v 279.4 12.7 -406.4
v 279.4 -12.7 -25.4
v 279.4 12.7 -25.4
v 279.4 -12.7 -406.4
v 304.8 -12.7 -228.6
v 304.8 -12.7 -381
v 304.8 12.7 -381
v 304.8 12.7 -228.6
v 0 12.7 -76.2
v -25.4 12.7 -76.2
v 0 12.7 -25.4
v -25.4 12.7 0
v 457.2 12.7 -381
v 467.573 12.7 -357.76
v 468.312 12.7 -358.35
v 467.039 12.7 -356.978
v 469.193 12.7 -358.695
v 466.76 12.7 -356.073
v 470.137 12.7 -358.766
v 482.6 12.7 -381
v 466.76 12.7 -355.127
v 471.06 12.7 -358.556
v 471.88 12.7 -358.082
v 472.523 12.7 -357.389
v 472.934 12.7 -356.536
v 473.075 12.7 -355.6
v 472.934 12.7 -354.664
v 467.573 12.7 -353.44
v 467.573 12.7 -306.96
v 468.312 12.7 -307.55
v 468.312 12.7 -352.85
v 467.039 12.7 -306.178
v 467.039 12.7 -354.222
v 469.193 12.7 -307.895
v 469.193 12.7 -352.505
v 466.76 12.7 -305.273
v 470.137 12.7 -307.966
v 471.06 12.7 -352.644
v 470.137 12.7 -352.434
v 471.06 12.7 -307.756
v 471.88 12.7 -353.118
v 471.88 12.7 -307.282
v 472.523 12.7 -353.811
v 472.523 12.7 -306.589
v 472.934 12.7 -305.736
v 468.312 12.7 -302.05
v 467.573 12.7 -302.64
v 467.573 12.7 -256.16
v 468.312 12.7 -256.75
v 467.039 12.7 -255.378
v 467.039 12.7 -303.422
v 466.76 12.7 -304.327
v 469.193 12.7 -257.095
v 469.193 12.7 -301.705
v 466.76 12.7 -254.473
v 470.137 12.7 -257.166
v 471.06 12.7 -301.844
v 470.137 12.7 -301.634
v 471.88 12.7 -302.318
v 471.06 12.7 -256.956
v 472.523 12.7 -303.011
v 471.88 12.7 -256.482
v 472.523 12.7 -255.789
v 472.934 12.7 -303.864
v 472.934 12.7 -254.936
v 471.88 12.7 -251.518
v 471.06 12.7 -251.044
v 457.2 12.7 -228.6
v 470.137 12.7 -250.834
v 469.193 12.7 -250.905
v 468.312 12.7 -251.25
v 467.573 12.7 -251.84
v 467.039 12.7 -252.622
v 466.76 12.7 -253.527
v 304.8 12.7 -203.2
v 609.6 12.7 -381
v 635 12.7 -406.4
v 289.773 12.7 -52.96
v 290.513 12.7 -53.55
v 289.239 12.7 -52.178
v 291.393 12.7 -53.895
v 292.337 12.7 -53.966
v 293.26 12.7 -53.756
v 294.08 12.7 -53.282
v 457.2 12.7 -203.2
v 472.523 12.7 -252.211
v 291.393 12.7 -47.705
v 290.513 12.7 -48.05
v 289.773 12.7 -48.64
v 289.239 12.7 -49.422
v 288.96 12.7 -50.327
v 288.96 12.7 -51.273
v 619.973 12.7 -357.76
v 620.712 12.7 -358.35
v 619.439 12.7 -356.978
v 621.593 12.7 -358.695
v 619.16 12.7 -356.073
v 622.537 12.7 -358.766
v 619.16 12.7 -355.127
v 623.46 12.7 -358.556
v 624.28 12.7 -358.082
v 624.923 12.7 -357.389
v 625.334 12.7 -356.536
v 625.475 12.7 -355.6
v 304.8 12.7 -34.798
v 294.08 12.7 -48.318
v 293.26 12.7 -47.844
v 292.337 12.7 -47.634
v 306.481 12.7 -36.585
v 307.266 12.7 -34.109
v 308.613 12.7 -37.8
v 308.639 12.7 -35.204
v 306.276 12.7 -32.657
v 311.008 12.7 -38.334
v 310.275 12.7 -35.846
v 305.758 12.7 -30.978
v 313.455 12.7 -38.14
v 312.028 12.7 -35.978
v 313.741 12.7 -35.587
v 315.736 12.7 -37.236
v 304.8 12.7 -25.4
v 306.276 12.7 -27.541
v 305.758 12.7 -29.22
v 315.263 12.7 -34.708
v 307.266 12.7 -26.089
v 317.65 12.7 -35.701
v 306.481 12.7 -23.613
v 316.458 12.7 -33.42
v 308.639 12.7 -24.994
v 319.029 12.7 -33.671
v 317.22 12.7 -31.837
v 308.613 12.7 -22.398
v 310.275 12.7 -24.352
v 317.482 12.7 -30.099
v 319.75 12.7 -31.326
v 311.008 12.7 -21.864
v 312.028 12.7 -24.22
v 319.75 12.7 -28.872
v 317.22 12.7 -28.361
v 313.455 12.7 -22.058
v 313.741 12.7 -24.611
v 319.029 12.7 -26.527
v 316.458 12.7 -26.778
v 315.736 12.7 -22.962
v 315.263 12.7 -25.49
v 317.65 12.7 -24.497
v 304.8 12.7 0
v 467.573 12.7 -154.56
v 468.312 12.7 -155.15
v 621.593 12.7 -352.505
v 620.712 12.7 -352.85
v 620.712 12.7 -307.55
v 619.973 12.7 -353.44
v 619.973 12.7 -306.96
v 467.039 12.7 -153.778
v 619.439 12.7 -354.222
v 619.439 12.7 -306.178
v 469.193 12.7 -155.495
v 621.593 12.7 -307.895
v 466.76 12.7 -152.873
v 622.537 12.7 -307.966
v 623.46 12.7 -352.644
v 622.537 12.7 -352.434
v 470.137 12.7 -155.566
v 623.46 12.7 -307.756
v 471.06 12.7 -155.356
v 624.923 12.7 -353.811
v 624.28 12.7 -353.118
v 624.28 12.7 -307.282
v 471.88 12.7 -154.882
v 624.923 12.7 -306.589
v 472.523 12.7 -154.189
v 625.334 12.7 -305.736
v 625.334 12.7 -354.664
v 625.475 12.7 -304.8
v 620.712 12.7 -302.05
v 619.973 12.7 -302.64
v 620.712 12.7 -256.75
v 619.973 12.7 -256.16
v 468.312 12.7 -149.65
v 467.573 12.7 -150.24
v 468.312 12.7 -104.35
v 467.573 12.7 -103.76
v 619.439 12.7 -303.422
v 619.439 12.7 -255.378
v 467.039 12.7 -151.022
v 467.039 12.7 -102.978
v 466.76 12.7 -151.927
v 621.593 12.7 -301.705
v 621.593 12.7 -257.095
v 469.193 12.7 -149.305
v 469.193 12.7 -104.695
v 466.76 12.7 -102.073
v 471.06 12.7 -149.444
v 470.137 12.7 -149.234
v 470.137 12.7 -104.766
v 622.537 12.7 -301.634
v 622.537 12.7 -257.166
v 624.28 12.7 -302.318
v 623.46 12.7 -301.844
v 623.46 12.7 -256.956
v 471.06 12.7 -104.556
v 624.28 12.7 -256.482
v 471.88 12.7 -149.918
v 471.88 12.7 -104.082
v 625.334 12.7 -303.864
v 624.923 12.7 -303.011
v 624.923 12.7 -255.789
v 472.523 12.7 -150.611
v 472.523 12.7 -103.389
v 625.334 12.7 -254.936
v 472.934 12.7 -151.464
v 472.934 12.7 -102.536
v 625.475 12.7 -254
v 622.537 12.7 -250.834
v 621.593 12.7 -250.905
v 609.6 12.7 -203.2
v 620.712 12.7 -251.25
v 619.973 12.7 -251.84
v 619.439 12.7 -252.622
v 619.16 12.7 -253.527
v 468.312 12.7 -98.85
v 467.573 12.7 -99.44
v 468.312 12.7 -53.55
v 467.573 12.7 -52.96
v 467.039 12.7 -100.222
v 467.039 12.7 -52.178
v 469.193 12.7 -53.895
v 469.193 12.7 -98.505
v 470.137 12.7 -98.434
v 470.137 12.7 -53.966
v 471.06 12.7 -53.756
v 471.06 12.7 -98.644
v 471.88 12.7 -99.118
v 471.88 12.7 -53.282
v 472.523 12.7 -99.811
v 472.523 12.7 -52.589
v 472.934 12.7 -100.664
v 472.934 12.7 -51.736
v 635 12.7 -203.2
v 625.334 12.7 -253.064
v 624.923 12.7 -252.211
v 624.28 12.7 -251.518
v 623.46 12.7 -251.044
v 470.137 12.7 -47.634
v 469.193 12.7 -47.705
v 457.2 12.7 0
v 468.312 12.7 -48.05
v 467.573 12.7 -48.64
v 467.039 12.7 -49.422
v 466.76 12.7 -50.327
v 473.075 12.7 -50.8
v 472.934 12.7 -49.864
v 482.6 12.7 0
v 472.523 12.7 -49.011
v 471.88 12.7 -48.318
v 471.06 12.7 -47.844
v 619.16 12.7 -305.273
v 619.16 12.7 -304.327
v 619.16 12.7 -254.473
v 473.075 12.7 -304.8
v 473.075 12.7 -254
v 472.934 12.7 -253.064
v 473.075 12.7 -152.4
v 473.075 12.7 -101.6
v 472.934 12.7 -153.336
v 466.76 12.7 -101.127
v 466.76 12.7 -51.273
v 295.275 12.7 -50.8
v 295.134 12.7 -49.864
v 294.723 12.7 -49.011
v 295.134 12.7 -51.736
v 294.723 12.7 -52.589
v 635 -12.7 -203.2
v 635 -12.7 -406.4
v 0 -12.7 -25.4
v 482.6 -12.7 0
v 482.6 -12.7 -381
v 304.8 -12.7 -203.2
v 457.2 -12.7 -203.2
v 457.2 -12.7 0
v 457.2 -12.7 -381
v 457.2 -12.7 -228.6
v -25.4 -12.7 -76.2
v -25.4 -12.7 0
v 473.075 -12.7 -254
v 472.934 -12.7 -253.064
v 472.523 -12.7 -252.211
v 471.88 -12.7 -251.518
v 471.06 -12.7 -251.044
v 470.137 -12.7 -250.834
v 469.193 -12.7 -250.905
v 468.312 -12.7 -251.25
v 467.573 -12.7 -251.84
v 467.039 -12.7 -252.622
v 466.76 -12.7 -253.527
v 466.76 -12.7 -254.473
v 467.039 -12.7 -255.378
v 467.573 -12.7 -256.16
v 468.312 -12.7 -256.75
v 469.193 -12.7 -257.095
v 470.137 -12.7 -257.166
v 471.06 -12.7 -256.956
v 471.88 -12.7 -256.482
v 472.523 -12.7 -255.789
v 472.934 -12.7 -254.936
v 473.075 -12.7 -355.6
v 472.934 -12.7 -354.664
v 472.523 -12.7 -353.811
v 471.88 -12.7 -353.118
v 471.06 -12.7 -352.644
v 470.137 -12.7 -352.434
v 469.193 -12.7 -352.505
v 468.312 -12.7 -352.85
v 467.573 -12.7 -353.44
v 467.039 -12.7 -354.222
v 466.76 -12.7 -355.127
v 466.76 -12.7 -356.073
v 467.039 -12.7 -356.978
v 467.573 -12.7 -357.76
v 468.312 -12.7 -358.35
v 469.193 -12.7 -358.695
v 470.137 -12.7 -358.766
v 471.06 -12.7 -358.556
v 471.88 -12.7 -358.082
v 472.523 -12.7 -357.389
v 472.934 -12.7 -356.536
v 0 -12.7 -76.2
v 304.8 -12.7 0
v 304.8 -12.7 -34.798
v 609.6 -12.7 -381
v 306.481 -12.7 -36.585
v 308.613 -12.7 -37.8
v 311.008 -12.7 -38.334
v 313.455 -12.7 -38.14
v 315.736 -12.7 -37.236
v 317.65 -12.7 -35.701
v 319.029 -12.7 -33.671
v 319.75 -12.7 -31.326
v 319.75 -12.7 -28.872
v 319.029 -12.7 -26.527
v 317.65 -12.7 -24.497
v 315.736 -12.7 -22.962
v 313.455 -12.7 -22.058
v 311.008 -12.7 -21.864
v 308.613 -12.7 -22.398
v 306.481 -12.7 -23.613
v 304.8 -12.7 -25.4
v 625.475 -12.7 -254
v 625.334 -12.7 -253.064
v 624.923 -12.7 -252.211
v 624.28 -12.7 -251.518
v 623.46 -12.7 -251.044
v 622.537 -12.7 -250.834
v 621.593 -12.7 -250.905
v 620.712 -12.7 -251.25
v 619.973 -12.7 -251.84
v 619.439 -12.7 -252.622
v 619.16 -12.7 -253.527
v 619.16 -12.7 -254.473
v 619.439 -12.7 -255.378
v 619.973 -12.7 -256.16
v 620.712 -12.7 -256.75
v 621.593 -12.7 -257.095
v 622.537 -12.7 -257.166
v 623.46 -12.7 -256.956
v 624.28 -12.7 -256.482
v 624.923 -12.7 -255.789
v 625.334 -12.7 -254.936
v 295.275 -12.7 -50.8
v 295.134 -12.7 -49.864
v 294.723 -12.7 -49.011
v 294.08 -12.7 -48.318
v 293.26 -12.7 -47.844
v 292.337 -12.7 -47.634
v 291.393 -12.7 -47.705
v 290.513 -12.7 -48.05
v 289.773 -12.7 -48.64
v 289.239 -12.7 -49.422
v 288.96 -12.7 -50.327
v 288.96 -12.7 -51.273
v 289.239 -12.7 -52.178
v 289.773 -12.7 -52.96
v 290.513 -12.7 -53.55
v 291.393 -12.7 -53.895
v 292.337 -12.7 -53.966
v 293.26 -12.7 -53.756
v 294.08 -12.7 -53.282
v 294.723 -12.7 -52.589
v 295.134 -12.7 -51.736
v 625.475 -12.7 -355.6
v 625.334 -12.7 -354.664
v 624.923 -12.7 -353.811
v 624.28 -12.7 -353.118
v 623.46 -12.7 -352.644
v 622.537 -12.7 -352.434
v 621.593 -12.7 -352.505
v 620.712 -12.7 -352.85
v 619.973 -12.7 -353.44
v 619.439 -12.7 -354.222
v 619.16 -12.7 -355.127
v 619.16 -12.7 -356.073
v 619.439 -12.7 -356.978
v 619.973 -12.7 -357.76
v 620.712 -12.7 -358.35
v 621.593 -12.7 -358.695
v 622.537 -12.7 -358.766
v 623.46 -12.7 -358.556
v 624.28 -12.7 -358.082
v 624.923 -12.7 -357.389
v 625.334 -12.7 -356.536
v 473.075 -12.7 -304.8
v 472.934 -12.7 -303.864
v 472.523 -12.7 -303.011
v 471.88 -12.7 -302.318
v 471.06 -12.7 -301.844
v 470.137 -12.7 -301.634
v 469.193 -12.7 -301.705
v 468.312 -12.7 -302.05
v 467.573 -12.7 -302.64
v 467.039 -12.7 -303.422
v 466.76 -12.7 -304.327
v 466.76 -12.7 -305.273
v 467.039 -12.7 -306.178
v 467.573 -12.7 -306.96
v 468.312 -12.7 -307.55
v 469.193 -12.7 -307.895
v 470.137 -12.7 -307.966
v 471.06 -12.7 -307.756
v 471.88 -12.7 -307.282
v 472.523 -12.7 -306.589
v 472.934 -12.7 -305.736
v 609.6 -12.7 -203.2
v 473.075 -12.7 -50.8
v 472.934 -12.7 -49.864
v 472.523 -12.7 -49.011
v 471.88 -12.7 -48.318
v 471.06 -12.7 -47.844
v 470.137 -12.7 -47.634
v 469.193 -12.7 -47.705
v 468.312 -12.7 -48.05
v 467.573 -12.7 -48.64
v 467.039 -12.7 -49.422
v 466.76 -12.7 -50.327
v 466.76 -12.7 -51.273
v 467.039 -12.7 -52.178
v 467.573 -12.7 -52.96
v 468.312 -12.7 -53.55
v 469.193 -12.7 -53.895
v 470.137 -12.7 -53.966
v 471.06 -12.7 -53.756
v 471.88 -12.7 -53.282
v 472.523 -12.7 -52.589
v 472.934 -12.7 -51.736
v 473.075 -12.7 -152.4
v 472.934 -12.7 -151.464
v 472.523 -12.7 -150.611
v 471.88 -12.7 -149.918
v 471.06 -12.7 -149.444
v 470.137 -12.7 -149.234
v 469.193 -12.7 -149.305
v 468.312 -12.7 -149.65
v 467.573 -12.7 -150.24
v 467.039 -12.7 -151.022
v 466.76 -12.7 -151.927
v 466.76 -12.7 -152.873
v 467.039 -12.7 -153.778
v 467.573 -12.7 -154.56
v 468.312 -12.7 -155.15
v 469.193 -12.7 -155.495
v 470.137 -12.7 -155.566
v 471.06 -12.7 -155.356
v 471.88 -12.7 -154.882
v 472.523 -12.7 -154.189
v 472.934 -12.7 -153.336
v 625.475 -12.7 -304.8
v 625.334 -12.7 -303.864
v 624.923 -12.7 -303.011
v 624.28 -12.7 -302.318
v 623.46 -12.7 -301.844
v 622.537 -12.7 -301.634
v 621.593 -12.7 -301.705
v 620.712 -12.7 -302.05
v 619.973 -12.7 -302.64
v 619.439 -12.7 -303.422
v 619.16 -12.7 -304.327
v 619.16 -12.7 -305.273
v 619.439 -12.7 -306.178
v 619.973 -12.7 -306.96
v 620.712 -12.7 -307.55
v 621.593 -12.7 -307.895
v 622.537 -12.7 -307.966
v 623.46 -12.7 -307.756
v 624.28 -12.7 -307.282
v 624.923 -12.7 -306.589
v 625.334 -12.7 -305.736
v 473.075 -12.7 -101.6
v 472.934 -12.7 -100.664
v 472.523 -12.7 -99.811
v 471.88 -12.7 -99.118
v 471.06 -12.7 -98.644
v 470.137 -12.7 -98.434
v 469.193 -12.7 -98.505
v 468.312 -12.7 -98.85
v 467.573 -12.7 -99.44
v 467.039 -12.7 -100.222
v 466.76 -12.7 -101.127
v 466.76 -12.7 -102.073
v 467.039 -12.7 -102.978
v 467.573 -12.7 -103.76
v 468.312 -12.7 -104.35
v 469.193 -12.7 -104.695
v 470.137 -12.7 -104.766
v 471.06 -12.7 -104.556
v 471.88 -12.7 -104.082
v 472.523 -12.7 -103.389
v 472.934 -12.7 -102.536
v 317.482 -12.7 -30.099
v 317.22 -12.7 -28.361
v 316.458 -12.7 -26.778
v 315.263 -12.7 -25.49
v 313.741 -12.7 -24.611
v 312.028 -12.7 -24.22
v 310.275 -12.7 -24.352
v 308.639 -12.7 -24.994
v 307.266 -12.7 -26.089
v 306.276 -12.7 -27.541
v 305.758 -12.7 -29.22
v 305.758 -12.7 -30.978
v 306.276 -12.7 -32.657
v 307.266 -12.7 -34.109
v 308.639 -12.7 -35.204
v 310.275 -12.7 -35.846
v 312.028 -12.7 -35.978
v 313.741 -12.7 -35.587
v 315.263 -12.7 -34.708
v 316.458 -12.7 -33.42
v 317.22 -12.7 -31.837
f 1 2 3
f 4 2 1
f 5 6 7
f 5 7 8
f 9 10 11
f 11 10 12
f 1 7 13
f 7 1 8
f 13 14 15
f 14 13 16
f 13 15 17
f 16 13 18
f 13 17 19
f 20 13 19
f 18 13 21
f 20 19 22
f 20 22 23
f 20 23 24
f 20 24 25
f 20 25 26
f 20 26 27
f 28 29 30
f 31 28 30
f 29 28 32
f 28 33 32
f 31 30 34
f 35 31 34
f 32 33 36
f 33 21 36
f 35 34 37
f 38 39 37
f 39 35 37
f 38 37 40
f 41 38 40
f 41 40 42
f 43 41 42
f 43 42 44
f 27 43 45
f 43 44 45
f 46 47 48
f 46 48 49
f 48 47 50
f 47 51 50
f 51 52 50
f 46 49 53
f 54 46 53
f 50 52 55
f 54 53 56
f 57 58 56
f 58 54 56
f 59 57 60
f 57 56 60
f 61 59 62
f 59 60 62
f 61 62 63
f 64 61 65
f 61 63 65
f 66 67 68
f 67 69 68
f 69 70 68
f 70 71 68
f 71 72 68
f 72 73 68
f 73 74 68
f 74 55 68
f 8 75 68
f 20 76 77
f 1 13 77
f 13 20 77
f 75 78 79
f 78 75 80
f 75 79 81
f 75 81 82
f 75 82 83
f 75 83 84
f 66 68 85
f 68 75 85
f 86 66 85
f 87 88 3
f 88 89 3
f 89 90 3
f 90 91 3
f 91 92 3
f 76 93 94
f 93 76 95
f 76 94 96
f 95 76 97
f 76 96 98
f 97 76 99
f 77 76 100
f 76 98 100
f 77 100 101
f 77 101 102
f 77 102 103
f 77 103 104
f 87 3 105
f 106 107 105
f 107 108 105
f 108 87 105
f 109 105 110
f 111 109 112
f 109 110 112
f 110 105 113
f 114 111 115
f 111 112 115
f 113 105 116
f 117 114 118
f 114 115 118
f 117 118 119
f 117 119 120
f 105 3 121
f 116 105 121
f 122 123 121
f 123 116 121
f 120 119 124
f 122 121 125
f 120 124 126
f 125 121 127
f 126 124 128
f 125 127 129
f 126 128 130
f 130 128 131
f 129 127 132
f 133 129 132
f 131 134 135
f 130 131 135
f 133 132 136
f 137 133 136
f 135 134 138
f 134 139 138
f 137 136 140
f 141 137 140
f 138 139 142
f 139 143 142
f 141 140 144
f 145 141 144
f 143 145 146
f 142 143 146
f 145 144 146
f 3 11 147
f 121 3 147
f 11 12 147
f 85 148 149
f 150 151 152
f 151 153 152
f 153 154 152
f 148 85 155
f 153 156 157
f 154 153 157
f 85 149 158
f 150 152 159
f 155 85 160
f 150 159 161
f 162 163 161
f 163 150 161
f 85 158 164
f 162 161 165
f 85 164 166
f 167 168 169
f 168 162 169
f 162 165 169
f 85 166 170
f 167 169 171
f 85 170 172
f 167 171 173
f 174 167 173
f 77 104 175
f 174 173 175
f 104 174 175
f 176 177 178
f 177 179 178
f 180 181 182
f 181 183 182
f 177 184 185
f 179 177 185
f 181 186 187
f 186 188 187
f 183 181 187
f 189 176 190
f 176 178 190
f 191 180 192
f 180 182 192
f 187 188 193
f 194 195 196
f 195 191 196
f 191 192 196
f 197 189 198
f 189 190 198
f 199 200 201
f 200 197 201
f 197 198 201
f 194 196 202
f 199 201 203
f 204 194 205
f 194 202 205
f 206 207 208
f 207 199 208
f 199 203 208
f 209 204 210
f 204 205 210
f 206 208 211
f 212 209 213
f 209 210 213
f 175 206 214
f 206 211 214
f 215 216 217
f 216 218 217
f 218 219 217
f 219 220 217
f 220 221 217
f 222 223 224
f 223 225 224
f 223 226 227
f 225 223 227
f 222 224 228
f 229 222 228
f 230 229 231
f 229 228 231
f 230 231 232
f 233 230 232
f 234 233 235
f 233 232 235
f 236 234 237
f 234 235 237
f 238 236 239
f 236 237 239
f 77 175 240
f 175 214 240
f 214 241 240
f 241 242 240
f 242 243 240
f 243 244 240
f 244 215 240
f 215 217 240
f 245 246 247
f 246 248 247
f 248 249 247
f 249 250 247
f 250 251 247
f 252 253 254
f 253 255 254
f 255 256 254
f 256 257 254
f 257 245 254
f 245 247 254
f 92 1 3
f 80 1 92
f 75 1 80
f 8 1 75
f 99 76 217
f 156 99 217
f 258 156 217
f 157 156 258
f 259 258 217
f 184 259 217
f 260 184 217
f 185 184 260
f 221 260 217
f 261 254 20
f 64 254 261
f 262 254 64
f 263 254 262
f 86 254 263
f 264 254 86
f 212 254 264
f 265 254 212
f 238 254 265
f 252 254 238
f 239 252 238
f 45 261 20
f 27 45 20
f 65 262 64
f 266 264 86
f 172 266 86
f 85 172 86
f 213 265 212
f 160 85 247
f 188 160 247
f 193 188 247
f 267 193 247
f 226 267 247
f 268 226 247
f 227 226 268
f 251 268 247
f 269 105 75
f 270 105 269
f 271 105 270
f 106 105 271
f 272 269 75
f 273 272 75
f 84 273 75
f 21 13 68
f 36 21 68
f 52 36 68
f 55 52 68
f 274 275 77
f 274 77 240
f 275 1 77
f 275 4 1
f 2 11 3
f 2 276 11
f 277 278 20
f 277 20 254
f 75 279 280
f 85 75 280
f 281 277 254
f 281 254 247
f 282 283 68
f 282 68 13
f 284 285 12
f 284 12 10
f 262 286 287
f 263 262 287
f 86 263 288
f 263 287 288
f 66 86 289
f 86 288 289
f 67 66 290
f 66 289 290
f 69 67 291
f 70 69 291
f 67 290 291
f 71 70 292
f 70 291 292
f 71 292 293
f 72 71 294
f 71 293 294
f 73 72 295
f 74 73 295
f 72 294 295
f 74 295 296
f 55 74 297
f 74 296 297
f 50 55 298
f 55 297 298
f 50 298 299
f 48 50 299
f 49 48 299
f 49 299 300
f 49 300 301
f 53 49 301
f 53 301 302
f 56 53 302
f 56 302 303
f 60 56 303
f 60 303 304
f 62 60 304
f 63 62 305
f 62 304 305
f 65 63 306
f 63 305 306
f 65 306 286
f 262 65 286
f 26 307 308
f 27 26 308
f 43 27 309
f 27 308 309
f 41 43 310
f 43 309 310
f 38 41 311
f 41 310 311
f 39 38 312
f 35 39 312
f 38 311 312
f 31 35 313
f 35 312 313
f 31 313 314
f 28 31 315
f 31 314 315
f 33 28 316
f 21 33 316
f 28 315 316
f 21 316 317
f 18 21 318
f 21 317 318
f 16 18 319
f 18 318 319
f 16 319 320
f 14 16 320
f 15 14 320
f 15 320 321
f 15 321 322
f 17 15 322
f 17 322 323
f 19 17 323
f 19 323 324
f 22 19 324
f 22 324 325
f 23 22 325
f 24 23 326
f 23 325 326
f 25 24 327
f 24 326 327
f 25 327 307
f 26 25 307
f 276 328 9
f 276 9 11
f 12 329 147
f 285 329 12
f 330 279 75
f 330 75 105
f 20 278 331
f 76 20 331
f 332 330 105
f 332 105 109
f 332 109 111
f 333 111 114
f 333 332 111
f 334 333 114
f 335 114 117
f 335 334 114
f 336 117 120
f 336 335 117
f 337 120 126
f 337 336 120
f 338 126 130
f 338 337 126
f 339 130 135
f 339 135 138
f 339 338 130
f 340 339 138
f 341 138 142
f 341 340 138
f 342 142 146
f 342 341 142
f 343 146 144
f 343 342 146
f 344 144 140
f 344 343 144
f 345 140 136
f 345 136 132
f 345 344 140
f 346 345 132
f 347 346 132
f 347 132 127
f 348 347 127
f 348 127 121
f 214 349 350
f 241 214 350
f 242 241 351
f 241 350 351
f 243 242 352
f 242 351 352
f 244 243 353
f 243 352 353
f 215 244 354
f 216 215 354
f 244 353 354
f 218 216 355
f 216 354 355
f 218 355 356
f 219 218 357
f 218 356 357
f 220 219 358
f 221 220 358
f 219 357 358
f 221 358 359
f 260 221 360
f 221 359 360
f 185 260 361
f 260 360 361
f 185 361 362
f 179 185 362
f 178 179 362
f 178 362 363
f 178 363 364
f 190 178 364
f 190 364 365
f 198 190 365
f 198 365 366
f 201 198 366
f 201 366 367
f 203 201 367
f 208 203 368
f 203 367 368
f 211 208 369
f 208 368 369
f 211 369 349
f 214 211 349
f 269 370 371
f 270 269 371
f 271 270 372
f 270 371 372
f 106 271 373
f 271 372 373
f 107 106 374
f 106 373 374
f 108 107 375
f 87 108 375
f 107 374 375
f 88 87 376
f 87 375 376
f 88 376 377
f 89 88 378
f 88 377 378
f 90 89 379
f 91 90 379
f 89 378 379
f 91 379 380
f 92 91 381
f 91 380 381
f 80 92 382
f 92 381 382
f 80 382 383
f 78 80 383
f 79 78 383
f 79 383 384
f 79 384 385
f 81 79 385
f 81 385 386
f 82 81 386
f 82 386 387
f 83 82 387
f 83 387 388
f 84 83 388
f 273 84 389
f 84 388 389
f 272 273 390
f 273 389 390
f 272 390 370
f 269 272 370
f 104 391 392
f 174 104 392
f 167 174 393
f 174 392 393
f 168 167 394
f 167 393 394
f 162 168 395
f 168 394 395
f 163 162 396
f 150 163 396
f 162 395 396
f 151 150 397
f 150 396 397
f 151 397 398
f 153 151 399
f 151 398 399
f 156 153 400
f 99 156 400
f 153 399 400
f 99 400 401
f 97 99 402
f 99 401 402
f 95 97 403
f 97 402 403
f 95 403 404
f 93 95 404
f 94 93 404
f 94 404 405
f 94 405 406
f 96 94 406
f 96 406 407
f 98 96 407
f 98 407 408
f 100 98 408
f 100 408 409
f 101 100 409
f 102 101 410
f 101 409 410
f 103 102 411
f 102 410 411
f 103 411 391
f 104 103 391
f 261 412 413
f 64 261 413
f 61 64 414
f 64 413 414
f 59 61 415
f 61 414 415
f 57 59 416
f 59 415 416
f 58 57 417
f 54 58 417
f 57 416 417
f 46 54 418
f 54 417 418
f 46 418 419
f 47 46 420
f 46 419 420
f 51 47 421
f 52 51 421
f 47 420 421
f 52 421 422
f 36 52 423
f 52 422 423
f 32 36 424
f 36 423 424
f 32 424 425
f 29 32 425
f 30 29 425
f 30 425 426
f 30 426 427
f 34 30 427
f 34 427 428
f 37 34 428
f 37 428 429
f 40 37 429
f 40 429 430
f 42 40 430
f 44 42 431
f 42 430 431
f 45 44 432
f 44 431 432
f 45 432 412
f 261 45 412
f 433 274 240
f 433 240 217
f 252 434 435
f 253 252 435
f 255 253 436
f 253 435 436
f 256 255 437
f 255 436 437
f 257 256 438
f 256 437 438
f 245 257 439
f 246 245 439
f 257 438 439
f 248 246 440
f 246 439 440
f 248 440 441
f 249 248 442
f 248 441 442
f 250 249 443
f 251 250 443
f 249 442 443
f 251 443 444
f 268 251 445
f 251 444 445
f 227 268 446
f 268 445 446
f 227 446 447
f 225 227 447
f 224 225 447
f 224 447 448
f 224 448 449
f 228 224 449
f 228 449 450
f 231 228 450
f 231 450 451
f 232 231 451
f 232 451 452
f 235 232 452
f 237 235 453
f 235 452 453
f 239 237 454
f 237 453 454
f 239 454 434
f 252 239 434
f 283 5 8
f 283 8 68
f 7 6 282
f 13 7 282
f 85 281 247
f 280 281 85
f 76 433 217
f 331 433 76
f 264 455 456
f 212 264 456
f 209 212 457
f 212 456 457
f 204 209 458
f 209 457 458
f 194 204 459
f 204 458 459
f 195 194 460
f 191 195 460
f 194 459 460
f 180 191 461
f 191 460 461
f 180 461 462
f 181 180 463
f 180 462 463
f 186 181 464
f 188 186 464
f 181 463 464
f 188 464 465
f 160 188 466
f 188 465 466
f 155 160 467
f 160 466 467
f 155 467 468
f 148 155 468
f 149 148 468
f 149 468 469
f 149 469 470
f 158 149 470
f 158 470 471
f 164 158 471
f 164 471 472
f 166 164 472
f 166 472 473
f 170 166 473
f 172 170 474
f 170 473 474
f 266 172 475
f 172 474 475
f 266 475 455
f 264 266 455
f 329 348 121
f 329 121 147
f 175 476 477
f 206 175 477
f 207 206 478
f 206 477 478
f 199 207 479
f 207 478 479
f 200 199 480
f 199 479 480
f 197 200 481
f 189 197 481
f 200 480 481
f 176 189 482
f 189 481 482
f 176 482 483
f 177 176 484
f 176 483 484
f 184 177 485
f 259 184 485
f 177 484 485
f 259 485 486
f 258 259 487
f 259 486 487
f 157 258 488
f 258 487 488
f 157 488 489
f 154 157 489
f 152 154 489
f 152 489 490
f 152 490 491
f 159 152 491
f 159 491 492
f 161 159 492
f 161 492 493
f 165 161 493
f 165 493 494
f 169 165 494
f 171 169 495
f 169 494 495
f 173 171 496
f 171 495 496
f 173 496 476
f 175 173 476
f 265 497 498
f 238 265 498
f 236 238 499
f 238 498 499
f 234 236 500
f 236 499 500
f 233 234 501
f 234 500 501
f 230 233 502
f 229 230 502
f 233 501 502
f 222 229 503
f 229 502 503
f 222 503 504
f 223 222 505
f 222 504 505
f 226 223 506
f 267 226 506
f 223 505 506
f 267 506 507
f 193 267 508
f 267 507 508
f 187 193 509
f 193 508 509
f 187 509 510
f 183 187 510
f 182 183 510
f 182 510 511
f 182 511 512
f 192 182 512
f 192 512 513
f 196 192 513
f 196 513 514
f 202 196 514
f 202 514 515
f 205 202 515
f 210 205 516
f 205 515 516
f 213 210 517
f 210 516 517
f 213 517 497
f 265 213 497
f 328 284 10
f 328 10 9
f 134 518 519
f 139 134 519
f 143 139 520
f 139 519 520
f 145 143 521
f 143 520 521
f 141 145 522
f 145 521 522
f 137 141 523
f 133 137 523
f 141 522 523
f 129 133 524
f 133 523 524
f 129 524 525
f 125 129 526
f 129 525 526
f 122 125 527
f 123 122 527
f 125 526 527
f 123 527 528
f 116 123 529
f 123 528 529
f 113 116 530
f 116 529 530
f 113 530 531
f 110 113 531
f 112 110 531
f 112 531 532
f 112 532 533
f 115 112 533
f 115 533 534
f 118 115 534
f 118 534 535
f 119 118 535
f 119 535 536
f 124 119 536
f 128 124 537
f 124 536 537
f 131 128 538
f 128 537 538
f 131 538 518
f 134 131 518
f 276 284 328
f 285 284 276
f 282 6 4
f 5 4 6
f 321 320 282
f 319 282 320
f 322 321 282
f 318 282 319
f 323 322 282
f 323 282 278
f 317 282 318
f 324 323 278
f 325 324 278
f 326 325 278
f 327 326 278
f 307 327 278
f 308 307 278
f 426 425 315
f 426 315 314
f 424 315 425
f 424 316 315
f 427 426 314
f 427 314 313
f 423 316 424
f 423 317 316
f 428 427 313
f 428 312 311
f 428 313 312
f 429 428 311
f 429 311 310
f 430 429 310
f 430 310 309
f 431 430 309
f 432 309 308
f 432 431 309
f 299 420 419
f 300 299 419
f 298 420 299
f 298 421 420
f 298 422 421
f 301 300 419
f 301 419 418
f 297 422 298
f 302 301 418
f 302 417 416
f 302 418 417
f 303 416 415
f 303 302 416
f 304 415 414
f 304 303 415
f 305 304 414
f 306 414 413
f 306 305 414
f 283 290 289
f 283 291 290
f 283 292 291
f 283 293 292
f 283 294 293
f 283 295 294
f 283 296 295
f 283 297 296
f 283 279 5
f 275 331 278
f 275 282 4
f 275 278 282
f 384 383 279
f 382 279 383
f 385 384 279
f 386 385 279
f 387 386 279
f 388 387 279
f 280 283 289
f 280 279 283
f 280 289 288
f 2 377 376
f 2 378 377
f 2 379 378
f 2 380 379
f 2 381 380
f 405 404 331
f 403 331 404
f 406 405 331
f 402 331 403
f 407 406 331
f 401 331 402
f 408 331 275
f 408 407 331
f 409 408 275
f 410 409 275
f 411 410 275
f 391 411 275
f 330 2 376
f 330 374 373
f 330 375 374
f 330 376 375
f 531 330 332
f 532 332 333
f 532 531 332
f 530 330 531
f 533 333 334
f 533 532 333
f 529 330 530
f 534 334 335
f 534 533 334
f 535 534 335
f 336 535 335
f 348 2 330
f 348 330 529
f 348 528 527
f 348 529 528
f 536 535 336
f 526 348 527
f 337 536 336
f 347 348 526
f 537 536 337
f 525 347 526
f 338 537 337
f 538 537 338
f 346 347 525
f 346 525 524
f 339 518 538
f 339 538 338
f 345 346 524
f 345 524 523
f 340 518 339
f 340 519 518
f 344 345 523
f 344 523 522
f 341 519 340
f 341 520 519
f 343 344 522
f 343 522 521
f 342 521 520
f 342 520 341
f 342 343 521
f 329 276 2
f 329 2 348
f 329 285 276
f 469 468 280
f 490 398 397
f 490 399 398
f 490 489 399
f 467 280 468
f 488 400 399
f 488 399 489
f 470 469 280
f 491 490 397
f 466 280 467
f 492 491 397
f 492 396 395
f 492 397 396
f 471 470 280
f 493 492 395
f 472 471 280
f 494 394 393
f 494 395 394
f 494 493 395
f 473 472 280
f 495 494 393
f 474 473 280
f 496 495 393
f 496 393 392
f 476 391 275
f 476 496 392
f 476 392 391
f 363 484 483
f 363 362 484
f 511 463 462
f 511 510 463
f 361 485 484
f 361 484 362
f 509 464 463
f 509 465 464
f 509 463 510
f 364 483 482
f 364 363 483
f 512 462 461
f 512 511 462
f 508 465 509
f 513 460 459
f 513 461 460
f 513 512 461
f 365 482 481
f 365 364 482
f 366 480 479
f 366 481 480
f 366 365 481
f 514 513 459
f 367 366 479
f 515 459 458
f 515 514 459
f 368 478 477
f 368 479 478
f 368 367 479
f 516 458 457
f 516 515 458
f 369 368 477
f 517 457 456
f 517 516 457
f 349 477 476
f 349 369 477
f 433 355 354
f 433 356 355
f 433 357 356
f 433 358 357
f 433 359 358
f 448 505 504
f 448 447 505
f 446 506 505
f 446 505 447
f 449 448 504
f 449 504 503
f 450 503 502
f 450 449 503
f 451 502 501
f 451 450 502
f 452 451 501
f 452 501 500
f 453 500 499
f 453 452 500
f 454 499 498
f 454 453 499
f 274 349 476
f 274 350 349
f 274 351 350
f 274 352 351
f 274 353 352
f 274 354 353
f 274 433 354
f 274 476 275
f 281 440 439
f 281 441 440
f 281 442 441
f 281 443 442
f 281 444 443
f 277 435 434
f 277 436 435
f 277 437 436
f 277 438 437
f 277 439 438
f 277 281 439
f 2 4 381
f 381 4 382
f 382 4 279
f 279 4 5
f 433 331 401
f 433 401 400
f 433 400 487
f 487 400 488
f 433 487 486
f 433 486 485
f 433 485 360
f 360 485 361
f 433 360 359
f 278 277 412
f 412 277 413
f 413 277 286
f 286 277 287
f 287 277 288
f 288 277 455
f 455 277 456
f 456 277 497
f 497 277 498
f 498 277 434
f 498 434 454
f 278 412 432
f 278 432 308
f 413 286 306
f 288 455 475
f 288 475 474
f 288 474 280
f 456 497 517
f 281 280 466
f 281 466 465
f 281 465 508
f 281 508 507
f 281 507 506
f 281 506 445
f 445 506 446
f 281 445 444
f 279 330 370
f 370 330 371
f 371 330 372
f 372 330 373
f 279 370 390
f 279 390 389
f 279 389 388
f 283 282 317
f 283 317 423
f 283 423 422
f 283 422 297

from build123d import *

# Parameters (mm, degrees)
F0_W      = 279.4
F0_H      = 25.4
F0_W_2    = 152.4
F0_W_3    = 25.4
F0_W_4    = 127
F1_DEPTH  = 12.7
F2_R      = 3.175
F3_DEPTH  = 50.8
F4_DEPTH  = 25.4
F5_R      = 8.255
F6_DEPTH  = 25.4
F9_R      = 5.8951712564
F10_DEPTH = 25.4


# Not quite as in the source:
# - the program builds the solid bodies; features that only make, move or delete a surface that nothing else refers to are left out


with BuildPart() as f1:
    # F0 (on Front) → F1 (new body, symmetric)
    with BuildSketch(Plane.XZ):
        with Locations((139.7, -12.7)):
            Rectangle(F0_W, F0_H)
        Polygon((0, -25.4), (0, 0), (-25.4, 0), (-25.4, -76.2), (0, -76.2), align=None)
        Polygon((304.8, 0), (279.4, 0), (279.4, -25.4), (279.4, -406.4), (304.8, -406.4), (304.8, -381), (304.8, -228.6), (304.8, -203.2), align=None)
        with Locations((381, -215.9)):
            Rectangle(F0_W_2, F0_H)
        with Locations((381, -393.7)):
            Rectangle(F0_W_2, F0_H)
        Polygon((457.2, 0), (457.2, -203.2), (457.2, -228.6), (457.2, -381), (482.6, -381), (482.6, 0), align=None)
        with Locations((469.9, -393.7)):
            Rectangle(F0_W_3, F0_H)
        with Locations((546.1, -393.7)):
            Rectangle(F0_W_4, F0_H)
        Polygon((609.6, -381), (609.6, -406.4), (635, -406.4), (635, -203.2), (609.6, -203.2), align=None)
    extrude(amount=F1_DEPTH, both=True)

    # F2 (on face) → F3 (cut)
    with BuildSketch(Plane.XZ.offset(12.7)):
        with Locations((469.9, -101.6)):
            Circle(F2_R)
        with Locations((469.9, -50.8)):
            Circle(F2_R)
        with Locations((469.9, -152.4)):
            Circle(F2_R)
        with Locations((469.9, -304.8)):
            Circle(F2_R)
        with Locations((469.9, -254)):
            Circle(F2_R)
        with Locations((469.9, -355.6)):
            Circle(F2_R)
        with Locations((622.3, -304.8)):
            Circle(F2_R)
        with Locations((622.3, -254)):
            Circle(F2_R)
        with Locations((622.3, -355.6)):
            Circle(F2_R)
        with Locations((292.1, -50.8)):
            Circle(F2_R)
    extrude(amount=F3_DEPTH, mode=Mode.SUBTRACT)

    # F2 (on face) → F4 (cut)
    with BuildSketch(Plane.XZ.offset(12.7)):
        with Locations((469.9, -101.6)):
            Circle(F2_R)
        with Locations((469.9, -50.8)):
            Circle(F2_R)
        with Locations((469.9, -152.4)):
            Circle(F2_R)
        with Locations((469.9, -304.8)):
            Circle(F2_R)
        with Locations((469.9, -254)):
            Circle(F2_R)
        with Locations((469.9, -355.6)):
            Circle(F2_R)
        with Locations((622.3, -304.8)):
            Circle(F2_R)
        with Locations((622.3, -254)):
            Circle(F2_R)
        with Locations((622.3, -355.6)):
            Circle(F2_R)
        with Locations((292.1, -50.8)):
            Circle(F2_R)
    extrude(amount=-F4_DEPTH, mode=Mode.SUBTRACT)

    # F5 (on face) → F6 (join)
    with BuildSketch(Plane.XZ.offset(12.7)):
        with Locations((311.5870648182, -30.0990186373)):
            Circle(F5_R)
    extrude(amount=-F6_DEPTH)

    # F9 (on face) → F10 (cut)
    with BuildSketch(Plane.XZ.offset(12.7)):
        with Locations((311.5870648182, -30.0990186373)):
            Circle(F9_R)
    extrude(amount=-F10_DEPTH, mode=Mode.SUBTRACT)


solid = f1.part
